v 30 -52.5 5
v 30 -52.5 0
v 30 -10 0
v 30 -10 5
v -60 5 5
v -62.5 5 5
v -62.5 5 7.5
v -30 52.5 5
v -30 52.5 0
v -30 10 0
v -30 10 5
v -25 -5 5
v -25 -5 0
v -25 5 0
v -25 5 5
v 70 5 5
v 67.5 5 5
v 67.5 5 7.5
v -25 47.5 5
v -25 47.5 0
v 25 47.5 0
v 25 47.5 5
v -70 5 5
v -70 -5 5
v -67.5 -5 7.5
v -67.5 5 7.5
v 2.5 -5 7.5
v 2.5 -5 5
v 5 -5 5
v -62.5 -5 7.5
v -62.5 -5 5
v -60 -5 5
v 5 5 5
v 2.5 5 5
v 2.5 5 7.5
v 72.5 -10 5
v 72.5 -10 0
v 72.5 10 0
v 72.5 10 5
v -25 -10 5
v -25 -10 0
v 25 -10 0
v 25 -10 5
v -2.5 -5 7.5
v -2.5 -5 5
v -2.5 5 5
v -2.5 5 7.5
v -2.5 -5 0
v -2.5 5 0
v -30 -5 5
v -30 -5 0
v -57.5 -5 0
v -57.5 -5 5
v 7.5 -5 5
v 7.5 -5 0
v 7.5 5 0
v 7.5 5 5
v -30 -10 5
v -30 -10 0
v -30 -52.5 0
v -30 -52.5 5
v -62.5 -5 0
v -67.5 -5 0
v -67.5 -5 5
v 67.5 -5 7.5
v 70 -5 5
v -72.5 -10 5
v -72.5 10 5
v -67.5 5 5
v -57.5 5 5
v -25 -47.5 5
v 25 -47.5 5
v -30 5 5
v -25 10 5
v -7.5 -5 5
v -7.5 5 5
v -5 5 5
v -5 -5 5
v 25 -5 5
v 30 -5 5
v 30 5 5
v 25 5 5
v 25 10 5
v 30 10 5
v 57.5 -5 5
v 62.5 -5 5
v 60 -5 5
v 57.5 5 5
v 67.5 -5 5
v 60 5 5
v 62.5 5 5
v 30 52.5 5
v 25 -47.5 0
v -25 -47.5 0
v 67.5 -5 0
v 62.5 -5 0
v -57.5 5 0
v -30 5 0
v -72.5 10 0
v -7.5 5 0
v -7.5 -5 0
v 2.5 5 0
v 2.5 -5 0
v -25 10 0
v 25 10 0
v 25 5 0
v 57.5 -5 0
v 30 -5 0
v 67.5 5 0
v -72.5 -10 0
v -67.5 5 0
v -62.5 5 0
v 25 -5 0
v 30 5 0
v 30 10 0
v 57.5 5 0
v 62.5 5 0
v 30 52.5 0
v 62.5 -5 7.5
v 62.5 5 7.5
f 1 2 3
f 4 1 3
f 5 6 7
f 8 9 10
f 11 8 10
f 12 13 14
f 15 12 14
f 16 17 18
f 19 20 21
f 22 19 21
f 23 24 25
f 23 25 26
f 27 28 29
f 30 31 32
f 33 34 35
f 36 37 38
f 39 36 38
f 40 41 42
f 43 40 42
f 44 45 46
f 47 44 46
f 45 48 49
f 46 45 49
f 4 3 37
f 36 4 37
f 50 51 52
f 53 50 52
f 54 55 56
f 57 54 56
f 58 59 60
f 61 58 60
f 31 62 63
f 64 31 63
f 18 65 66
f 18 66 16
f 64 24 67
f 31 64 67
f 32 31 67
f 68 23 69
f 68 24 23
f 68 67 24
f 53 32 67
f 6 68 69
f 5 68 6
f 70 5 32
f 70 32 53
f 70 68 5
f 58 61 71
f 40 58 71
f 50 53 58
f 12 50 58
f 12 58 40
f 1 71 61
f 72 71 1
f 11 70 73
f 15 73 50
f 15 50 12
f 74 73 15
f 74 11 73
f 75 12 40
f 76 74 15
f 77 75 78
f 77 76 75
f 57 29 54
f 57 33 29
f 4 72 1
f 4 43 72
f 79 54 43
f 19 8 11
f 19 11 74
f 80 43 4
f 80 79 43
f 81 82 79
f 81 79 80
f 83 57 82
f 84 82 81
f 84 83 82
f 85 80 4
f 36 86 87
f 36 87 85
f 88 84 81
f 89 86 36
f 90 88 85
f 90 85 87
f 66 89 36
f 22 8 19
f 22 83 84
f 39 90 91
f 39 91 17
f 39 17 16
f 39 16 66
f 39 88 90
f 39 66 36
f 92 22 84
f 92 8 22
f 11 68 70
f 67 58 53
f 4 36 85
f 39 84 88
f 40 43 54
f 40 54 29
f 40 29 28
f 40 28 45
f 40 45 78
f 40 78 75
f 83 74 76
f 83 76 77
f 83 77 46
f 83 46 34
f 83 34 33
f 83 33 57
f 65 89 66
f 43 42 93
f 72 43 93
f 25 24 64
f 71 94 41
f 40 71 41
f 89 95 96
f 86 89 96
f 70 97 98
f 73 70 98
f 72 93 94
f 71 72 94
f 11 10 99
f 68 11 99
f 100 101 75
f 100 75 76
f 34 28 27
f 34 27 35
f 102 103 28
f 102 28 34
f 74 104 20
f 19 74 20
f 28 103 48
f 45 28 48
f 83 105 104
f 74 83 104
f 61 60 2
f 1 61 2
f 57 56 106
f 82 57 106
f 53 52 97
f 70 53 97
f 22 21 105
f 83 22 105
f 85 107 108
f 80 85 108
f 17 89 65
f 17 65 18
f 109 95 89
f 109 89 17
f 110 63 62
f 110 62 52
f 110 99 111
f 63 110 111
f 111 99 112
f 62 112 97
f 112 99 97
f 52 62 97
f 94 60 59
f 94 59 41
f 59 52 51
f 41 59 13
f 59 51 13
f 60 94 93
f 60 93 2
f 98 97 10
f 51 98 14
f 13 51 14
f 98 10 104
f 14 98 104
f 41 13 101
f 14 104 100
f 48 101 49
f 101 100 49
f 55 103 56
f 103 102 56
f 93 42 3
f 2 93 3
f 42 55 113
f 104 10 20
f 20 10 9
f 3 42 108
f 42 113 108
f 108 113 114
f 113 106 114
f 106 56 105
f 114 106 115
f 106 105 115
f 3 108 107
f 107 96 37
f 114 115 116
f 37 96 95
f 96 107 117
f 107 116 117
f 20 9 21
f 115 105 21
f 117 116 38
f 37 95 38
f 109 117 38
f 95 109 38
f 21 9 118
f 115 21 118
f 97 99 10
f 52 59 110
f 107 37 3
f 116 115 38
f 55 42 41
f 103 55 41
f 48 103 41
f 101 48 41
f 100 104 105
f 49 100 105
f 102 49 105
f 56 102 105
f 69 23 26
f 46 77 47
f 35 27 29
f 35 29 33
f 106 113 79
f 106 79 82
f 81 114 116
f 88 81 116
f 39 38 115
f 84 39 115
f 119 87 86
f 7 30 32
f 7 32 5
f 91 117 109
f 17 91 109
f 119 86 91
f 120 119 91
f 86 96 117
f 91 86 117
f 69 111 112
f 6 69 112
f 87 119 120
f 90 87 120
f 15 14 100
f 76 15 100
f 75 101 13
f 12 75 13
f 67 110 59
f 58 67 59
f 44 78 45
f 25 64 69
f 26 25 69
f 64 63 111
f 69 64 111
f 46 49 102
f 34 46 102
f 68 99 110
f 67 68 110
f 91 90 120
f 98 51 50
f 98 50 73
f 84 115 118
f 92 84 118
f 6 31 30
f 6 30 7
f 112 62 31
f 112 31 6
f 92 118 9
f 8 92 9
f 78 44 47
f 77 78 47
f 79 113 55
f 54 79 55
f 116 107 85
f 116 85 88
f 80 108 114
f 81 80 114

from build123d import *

# Parameters (mm, degrees)
F0_W     = 5
F0_H     = 5
F0_W_2   = 2.5
F0_H_2   = 10
F1_DEPTH = 5
F2_DEPTH = 7.5
F3_SIZE  = 2.49999


# Not quite as in the source:
# - a fillet or chamfer is up to 0.001 mm smaller than in the source, because OpenCascade refuses the exact size
# - a feature names something its author has since deleted; it is built from what else it names


with BuildPart() as f1:
    # F0 (on Top) → F1 (new body)
    with BuildSketch(Plane.XY):
        Polygon((-5, 5), (-2.5, 5), (2.5, 5), (5, 5), (7.5, 5), (25, 5), (25, 10), (-25, 10), (-25, 5), (-7.5, 5), align=None)
        Polygon((-57.5, 5), (-30, 5), (-30, 10), (-72.5, 10), (-72.5, 5), (-70, 5), (-67.5, 5), (-62.5, 5), (-60, 5), align=None)
        Polygon((-30, 10), (-25, 10), (-25, 47.5), (25, 47.5), (25, 10), (30, 10), (30, 52.5), (-30, 52.5), align=None)
        with Locations((-27.5, 7.5)):
            Rectangle(F0_W, F0_H)
        with Locations((-27.5, -7.5)):
            Rectangle(F0_W, F0_H)
        Polygon((-25, -47.5), (-25, -10), (-30, -10), (-30, -52.5), (30, -52.5), (30, -10), (25, -10), (25, -47.5), align=None)
        with Locations((27.5, 7.5)):
            Rectangle(F0_W, F0_H)
        Polygon((30, 10), (30, 5), (57.5, 5), (60, 5), (62.5, 5), (67.5, 5), (70, 5), (72.5, 5), (72.5, 10), align=None)
        with Locations((27.5, -7.5)):
            Rectangle(F0_W, F0_H)
        with Locations((61.25, 0)):
            Rectangle(F0_W_2, F0_H_2)
        with Locations((68.75, 0)):
            Rectangle(F0_W_2, F0_H_2)
        Polygon((2.5, -5), (-2.5, -5), (-5, -5), (-7.5, -5), (-25, -5), (-25, -10), (25, -10), (25, -5), (7.5, -5), (5, -5), align=None)
        with Locations((-3.75, 0)):
            Rectangle(F0_W_2, F0_H_2)
        with Locations((3.75, 0)):
            Rectangle(F0_W_2, F0_H_2)
        Polygon((-30, -10), (-30, -5), (-57.5, -5), (-60, -5), (-62.5, -5), (-67.5, -5), (-70, -5), (-72.5, -5), (-72.5, -10), align=None)
        with Locations((-68.75, 0)):
            Rectangle(F0_W_2, F0_H_2)
        with Locations((-61.25, 0)):
            Rectangle(F0_W_2, F0_H_2)
        with Locations((-71.25, 0)):
            Rectangle(F0_W_2, F0_H_2)
        with Locations((-58.75, 0)):
            Rectangle(F0_W_2, F0_H_2)
        Polygon((57.5, -5), (30, -5), (30, -10), (72.5, -10), (72.5, -5), (70, -5), (67.5, -5), (62.5, -5), (60, -5), align=None)
        with Locations((58.75, 0)):
            Rectangle(F0_W_2, F0_H_2)
        with Locations((71.25, 0)):
            Rectangle(F0_W_2, F0_H_2)
        with Locations((6.25, 0)):
            Rectangle(F0_W_2, F0_H_2)
        with Locations((-6.25, 0)):
            Rectangle(F0_W_2, F0_H_2)
        with Locations((-27.5, 0)):
            Rectangle(F0_W, F0_H_2)
        with Locations((27.5, 0)):
            Rectangle(F0_W, F0_H_2)
    extrude(amount=F1_DEPTH)

    # F0 (on Top) → F2 (join)
    with BuildSketch(Plane.XY):
        with Locations((-68.75, 0)):
            Rectangle(F0_W_2, F0_H_2)
        with Locations((-61.25, 0)):
            Rectangle(F0_W_2, F0_H_2)
        with Locations((-3.75, 0)):
            Rectangle(F0_W_2, F0_H_2)
        with Locations((3.75, 0)):
            Rectangle(F0_W_2, F0_H_2)
        with Locations((61.25, 0)):
            Rectangle(F0_W_2, F0_H_2)
        with Locations((68.75, 0)):
            Rectangle(F0_W_2, F0_H_2)
    extrude(amount=F2_DEPTH)

    # F3 (size 2.5 in the source; OpenCascade refuses exactly that, so slightly less here)
    f3_edges = [f1.edges().sort_by_distance(p)[0] for p in [
        (70, 0, 7.5),
        (60, 0, 7.5),
        (5, 0, 7.5),
        (-5, 0, 7.5),
        (-60, 0, 7.5),
        (-70, 0, 7.5),
    ]]
    chamfer(f3_edges, length=F3_SIZE)


solid = f1.part
